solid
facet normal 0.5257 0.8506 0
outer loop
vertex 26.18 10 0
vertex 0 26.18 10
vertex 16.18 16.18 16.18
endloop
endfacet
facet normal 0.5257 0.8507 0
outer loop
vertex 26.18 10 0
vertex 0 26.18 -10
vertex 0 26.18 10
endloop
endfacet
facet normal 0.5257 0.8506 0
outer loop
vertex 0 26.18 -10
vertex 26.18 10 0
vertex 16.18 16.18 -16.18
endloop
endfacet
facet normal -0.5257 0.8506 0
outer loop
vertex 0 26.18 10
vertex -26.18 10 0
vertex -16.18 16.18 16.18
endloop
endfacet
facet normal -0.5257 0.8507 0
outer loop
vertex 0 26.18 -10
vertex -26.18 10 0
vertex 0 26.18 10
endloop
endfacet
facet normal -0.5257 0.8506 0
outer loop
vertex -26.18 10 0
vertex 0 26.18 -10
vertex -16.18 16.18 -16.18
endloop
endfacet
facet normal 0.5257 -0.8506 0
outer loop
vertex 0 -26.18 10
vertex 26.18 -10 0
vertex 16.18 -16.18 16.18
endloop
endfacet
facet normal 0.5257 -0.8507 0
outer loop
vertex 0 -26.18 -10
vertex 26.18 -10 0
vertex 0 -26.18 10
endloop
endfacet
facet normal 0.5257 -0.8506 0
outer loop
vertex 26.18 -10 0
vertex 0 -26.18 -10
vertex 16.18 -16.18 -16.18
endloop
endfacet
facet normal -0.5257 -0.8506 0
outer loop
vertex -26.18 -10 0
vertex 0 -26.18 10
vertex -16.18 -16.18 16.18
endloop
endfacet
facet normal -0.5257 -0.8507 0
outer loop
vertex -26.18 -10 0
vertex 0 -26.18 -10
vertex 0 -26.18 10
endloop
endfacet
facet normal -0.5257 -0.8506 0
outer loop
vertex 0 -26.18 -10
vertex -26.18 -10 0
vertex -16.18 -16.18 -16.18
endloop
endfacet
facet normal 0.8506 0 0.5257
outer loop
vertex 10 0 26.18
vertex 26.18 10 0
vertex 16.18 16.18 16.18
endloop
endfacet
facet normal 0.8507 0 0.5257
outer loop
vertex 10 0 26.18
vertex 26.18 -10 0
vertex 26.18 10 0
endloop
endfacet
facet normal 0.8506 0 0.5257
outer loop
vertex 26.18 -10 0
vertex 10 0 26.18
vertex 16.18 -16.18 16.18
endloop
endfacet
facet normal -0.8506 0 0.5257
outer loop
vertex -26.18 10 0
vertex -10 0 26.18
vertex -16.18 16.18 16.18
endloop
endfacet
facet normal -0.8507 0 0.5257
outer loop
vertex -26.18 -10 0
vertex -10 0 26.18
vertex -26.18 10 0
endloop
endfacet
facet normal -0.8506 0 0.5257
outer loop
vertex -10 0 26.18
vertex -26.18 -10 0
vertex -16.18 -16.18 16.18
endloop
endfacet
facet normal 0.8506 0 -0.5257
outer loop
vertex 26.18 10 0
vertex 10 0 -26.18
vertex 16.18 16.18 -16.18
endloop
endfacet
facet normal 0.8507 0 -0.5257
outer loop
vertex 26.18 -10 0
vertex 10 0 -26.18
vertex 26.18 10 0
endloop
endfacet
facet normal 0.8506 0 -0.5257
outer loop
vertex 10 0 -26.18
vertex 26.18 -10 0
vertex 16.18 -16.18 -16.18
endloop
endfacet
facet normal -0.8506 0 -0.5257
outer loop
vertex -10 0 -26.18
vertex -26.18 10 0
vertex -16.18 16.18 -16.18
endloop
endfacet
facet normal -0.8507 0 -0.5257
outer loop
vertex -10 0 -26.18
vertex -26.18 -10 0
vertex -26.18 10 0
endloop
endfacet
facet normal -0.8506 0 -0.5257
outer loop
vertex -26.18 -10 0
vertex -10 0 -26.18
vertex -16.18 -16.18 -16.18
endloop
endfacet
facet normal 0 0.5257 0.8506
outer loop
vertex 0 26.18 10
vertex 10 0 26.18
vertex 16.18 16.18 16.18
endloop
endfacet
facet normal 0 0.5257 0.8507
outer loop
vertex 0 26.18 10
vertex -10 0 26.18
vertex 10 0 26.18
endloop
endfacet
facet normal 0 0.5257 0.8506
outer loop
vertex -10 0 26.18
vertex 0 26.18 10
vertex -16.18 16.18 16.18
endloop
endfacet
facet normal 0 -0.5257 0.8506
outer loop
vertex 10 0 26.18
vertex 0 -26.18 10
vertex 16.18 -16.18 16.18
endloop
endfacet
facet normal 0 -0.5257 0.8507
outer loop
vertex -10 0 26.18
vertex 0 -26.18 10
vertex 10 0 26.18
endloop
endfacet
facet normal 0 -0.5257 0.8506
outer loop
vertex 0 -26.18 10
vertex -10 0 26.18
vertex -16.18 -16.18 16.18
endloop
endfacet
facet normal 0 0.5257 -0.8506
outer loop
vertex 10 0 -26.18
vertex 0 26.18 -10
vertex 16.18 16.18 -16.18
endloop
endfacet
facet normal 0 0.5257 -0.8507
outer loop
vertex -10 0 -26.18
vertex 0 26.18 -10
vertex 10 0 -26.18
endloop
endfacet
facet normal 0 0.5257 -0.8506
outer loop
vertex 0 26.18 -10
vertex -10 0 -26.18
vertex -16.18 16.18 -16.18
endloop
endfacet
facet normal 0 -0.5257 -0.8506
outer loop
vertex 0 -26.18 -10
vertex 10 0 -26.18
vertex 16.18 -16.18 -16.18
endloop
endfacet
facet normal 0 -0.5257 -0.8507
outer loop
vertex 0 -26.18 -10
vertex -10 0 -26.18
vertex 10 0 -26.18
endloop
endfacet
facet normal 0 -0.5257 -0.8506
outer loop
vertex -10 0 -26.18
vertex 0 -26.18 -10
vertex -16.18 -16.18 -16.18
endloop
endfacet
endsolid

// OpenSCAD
// Regular Dodecahedron
// (C) @oblomobka - 2023.05
// GPL license

/* **CUSTOMIZER VARIABLES** */
// Edge
edge=20; //[10:100]
// Center of the solid or stand over a face
position = "Center"; //["Center", "Face"]

/* **MODULES** */
module DodecahedronRegular(edge=20, position="Face"){
    
    // Constants
    phi = (1+sqrt(5))/2; // Golden ratio = 1,618...
    
    // Invariants
    diAngleDodecahedron = acos(-1/sqrt(5))/*atan(1/phi)*/; // dihedral angle of Dodecahedron = 116,56505...
    
    // Relations
    rCirDodecahedron = sqrt(3)*phi/2; // Radius of a circumscribed sphere for edge = 1 / =1,401...
    rInsDodecahedron = phi^2/(2*sqrt(3-phi)); // radius of a inscribed sphere for edge = 1 / =1,1135...
    rMidDodecahedron = phi^2/2; // Midradius, which touches the middle of each edge / =1,309...
    
    // Variables
    diagonal = phi; // x depicts the edge of cube inscrit in the dodecahedron, that is the lenght of the diagonal of regular pentagon
    a = edge*diagonal/2; // to depicts the coordinates of cube inscrit in a pentagon center in (0,0,0) - 8 vertices
    // Even permutations (+-phi, +-1/phi, 0) for the inscrit cube (+-1, +-1, +-1) / ratio longside : shortside = phi : (1/phi) -> phi^2
    b = (edge*phi^2)/2;     // long side of the rectangle - equivalente to phi
    c = edge/2;             // short side of the rectangle - equivalente to 1/phi
    
    // Definition of points and faces V = 20 / F = 12
    Dpoints = [
        // Build the cube inscrit in the Dodecahedron
        [+a, +a, +a], [-a, +a, +a], [+a, -a, +a], [-a, -a, +a],     // UP       [  0,  1,  2,  3]
        [+a, +a, -a], [-a, +a, -a], [+a, -a, -a], [-a, -a, -a],     // DOWN     [  4,  5,  6,  7]
        // Even permutations, every line draw a rectangule
        [+b, +c, 0], [-b, +c, 0], [+b, -c, 0], [-b, -c, 0],         // XY       [  8,  9, 10, 11]
        [+c, 0, +b], [+c, 0, -b], [-c, 0, +b], [-c, 0, -b],         // XZ       [ 12, 13, 14, 15]
        [0, +b, +c], [0, -b, +c], [0, +b, -c], [0, -b, -c]          // YZ       [ 16, 17, 18, 19]
        ];
         
    Dfaces = [
        [  0, 16, 18,  4,  8], [  1,  9,  5, 18, 16], [  2, 10,  6, 19, 17], [  3, 17, 19,  7, 11],  // Edges XY
        [  0,  8, 10,  2, 12], [  1, 14,  3, 11,  9], [  4, 13,  6, 10,  8], [  5,  9, 11,  7, 15],  // Edges XZ
        [  0, 12, 14,  1, 16], [  2, 17,  3, 14, 12], [  4, 18,  5, 15, 13], [  6, 13, 15,  7, 19]   // Edges YZ
        ];
    
    // Polyhedron stands on xy plane centered on the center of the face or centered on the center of polyhedron
    if(position=="Face"){
        translate([ 0, 0, edge*rInsDodecahedron])
            rotate([90-diAngleDodecahedron/2, 0, 0])
                    polyhedron(Dpoints, Dfaces);}
                    
    else if(position=="Center") {
        polyhedron(Dpoints, Dfaces);
            } 
            
        } 

/* **RENDERING** */
DodecahedronRegular(edge=edge, position=position);
